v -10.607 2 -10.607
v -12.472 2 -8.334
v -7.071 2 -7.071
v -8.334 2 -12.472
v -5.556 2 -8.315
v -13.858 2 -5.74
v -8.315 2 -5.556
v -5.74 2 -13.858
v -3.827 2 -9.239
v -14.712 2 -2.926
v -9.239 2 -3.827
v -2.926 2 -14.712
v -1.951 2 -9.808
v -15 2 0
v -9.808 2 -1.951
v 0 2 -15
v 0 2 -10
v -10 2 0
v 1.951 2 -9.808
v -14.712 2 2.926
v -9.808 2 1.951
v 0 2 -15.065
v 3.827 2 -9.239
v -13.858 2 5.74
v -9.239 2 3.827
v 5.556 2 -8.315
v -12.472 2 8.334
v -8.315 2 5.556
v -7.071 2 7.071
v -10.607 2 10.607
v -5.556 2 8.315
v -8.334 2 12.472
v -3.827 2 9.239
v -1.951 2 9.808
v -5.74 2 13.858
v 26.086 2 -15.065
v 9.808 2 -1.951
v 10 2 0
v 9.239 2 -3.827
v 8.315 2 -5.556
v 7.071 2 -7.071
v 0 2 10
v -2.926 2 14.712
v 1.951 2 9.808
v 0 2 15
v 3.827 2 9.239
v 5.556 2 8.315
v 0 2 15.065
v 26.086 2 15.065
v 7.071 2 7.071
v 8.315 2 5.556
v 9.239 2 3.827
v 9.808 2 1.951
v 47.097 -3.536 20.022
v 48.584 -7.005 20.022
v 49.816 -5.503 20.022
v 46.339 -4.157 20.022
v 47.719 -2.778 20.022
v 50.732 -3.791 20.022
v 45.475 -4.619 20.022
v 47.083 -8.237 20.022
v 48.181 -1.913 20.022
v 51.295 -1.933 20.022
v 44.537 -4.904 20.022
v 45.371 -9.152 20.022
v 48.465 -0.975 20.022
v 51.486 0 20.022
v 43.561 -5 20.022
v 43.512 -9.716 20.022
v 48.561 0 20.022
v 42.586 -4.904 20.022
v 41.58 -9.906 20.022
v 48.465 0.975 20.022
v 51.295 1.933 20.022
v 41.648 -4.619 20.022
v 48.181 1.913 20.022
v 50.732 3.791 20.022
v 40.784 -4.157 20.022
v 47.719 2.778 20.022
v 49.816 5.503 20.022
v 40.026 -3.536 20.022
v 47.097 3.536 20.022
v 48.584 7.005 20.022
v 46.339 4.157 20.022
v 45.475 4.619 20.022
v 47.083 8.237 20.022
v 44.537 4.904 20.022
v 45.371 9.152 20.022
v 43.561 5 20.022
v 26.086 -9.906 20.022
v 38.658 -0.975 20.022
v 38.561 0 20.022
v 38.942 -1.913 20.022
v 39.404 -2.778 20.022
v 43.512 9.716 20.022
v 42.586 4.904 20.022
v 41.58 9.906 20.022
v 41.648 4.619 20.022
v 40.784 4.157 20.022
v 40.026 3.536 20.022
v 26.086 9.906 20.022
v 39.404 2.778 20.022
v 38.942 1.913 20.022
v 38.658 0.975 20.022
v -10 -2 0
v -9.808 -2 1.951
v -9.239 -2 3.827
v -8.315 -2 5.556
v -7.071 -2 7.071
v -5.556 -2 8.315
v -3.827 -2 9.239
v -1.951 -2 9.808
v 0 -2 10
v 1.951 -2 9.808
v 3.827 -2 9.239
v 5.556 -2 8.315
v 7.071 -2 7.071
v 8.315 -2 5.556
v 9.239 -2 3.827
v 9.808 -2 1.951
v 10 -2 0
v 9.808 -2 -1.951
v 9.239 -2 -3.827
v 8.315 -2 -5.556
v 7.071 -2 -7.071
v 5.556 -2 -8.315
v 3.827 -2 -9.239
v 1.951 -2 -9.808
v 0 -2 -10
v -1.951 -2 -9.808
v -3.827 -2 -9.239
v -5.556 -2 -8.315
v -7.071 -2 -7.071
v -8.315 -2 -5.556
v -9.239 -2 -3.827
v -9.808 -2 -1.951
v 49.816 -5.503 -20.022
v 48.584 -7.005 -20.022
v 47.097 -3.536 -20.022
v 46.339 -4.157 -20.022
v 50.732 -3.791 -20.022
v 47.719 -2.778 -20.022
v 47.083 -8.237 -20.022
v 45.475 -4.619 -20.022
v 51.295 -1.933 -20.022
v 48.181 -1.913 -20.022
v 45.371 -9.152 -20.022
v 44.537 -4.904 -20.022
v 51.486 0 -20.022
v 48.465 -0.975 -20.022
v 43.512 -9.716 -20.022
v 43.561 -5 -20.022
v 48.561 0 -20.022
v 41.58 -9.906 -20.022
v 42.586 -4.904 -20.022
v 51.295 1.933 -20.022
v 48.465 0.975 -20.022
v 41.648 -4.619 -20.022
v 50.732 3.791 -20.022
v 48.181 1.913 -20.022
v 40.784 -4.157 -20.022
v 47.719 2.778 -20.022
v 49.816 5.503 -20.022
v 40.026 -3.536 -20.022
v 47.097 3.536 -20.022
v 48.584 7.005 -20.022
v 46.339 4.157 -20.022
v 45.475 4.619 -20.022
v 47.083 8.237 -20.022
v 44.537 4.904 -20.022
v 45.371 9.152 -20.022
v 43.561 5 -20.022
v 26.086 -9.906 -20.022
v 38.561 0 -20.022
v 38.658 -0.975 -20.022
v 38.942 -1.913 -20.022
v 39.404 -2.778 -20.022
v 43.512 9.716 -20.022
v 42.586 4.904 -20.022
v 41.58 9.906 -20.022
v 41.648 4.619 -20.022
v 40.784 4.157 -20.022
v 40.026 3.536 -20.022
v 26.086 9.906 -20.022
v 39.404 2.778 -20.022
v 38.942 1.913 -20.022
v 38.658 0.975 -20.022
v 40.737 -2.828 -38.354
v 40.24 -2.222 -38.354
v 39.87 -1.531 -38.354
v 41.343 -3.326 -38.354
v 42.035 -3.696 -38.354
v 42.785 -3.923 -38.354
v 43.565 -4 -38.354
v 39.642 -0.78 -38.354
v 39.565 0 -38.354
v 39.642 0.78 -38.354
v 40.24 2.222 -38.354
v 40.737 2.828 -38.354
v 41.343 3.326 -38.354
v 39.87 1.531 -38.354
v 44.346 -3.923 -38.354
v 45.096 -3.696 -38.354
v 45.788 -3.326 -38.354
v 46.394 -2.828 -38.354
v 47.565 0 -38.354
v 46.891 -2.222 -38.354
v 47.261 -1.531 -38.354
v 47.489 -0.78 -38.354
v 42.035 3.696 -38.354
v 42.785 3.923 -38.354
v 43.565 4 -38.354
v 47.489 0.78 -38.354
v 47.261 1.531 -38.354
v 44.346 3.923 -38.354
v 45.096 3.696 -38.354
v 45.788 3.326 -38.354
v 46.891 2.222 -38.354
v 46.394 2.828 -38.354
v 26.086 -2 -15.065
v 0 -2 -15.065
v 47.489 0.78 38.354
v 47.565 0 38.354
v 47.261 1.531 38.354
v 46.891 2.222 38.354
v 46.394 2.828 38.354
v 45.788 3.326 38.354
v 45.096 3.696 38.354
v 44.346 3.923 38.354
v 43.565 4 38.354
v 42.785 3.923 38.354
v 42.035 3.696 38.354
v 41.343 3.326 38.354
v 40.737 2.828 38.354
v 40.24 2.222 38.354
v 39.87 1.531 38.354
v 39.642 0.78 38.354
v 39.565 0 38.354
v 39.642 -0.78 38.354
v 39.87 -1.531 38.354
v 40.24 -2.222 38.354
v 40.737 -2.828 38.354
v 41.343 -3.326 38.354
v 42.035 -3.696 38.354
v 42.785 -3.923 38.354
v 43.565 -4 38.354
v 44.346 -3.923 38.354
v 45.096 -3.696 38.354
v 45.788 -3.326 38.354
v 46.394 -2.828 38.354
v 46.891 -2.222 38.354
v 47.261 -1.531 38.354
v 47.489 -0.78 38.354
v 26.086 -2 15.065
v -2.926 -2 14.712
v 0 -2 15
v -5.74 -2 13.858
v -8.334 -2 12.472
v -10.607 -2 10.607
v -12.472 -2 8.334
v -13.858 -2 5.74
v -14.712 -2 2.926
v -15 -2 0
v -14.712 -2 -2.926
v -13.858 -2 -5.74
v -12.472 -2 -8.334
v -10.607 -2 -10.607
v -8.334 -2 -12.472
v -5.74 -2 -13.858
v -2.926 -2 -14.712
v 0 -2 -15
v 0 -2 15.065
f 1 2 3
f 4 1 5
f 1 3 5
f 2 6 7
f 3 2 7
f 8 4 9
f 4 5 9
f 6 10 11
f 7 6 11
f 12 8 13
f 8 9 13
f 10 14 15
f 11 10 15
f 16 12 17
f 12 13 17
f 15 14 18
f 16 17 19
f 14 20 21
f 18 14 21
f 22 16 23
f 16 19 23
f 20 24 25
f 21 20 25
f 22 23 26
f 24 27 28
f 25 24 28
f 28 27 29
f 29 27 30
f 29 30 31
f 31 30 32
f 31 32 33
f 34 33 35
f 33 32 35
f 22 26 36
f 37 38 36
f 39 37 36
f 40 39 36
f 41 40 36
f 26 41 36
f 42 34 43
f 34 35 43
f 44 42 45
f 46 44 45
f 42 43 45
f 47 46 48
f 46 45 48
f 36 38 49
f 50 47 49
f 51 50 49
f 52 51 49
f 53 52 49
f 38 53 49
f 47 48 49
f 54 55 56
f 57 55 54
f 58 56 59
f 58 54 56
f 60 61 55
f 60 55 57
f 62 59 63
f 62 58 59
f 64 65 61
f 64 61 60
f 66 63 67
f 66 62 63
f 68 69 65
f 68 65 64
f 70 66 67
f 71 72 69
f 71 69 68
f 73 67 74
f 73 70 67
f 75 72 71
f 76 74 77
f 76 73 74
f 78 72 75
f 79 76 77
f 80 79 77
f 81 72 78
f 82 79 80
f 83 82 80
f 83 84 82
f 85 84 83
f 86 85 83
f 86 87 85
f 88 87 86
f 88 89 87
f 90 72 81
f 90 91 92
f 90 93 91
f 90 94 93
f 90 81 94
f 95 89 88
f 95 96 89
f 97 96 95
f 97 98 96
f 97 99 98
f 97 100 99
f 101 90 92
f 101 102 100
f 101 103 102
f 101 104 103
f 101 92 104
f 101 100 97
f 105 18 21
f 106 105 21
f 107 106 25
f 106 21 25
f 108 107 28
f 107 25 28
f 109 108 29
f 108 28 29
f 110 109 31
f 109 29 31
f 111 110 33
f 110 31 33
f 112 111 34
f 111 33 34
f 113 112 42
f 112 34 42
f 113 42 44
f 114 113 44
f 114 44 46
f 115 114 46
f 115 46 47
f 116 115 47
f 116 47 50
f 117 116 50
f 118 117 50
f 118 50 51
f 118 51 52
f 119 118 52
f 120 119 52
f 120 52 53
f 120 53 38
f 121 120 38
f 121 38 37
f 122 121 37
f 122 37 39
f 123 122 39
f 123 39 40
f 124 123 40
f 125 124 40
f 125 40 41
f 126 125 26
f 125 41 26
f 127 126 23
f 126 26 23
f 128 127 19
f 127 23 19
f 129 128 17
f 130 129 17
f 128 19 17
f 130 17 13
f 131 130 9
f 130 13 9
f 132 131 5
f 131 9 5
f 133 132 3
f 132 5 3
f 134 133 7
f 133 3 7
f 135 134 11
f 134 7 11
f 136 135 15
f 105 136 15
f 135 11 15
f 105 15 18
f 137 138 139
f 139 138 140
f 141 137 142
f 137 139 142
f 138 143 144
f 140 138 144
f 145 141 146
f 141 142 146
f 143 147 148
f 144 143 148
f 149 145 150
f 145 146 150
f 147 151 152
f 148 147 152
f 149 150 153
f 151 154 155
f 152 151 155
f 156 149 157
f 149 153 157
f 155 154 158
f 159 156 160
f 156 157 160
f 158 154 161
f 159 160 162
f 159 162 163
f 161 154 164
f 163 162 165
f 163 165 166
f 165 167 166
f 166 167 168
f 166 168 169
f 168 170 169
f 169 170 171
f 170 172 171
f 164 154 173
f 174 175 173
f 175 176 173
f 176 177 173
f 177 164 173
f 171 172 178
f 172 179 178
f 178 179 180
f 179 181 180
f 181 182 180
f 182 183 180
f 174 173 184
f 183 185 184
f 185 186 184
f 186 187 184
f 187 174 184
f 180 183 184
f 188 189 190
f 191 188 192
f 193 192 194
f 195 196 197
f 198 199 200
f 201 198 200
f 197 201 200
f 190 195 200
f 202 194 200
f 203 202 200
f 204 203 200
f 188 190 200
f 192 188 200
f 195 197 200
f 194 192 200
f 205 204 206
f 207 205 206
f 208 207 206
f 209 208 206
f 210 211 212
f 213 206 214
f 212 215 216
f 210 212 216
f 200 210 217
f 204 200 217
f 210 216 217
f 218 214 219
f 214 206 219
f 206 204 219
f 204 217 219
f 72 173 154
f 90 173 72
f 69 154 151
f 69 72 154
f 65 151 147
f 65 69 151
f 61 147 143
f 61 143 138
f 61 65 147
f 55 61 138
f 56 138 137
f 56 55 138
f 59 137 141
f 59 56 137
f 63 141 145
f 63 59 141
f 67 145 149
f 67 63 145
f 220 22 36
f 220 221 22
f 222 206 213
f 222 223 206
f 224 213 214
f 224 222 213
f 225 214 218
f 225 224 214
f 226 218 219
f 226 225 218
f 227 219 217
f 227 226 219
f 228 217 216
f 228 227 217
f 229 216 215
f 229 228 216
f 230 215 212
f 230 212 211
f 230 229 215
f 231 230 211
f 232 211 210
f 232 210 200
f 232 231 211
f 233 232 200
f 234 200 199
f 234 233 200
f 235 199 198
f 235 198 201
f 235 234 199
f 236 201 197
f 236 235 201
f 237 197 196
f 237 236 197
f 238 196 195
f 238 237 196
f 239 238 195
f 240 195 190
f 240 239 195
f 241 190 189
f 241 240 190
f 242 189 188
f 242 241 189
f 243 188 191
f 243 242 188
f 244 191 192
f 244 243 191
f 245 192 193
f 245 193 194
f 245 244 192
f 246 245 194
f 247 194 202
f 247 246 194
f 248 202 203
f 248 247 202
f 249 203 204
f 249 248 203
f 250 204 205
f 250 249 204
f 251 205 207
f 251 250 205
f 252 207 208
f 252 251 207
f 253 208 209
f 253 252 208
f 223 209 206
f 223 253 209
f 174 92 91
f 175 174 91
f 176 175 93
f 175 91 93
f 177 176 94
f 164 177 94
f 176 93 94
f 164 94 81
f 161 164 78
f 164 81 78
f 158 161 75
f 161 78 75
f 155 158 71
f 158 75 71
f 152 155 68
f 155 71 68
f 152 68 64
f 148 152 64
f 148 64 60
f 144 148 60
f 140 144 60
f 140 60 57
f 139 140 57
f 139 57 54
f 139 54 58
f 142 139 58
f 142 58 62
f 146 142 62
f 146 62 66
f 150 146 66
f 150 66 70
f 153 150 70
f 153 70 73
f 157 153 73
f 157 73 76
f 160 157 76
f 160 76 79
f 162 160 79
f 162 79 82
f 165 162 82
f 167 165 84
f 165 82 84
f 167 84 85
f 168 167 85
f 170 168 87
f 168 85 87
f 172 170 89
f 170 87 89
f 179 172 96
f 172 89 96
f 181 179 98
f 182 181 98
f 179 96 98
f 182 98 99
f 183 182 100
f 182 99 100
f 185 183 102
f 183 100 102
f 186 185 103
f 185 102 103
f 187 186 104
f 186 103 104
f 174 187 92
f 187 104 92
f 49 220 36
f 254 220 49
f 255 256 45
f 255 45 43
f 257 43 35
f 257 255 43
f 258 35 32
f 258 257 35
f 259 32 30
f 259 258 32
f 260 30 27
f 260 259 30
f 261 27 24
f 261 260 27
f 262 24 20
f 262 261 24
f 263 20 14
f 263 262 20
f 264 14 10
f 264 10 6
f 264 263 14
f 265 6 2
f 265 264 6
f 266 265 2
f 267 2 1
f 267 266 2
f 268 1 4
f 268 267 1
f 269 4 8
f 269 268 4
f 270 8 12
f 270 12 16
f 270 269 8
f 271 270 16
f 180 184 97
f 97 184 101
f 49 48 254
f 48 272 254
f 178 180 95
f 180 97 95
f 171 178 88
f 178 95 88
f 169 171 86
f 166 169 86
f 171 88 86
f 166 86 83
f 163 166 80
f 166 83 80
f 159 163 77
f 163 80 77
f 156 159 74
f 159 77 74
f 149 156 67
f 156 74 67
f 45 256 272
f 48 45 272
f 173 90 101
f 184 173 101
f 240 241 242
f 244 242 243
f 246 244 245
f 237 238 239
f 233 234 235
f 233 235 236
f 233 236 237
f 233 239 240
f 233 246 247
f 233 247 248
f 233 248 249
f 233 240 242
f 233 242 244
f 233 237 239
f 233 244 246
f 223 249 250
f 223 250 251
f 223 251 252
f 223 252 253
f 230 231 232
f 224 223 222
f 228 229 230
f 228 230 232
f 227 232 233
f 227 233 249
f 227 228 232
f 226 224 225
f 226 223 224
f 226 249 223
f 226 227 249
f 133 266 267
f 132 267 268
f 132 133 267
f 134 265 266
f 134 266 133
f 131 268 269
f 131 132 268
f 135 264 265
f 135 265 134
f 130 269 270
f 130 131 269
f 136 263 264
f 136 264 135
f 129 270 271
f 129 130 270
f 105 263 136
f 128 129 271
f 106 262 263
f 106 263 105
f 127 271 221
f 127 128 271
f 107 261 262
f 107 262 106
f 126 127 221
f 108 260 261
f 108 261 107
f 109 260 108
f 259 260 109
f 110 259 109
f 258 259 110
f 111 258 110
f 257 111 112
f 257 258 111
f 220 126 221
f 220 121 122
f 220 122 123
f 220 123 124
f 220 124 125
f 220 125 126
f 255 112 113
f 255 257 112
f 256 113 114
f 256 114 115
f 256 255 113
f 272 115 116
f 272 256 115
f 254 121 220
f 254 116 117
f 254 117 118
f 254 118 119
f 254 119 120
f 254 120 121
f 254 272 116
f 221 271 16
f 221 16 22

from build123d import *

# Parameters (mm, degrees)
F0_R      = 15
F1_DEPTH  = 2
F3_W      = 26.0858
F3_H      = 15.0651354343
F4_DEPTH  = 2
F6_D      = 20
F7_W      = 19.812
F7_H      = 40.0436846481
F7_W_2    = 4
F7_H_2    = 30.1302708685
F8_DEPTH  = 25.4
F9_R      = 9.90599
F11_D     = 10
F12_R     = 4
F13_DEPTH = 38.354


# Not quite as in the source:
# - a fillet or chamfer is up to 0.001 mm smaller than in the source, because OpenCascade refuses the exact size


with BuildPart() as f1:
    # F0 (on Front) → F1 (new body, symmetric)
    with BuildSketch(Plane.XZ):
        Circle(F0_R)
    extrude(amount=F1_DEPTH, both=True)

    # F3 (on Front) → F4 (join, symmetric)
    with BuildSketch(Plane.XZ):
        with Locations((13.0429, 7.5325677171)):
            Rectangle(F3_W, F3_H)
    extrude(amount=F4_DEPTH, both=True)

    # F5: F1 across plane


with BuildPart() as f1_1:
    add(f1.part)
    add(f1.part.mirror(Plane.XY))

    # F6 (through all)
    with Locations(Plane.XZ.offset(2)):
        with Locations((0, 0)):
            Hole(F6_D / 2)


with BuildPart() as f8:
    # F7 (on face) → F8 (new body)
    with BuildSketch(Plane.YZ.offset(26.0858)):
        Rectangle(F7_W, F7_H)
        Rectangle(F7_W_2, F7_H_2, mode=Mode.SUBTRACT)
        Rectangle(F7_W_2, F7_H_2)
    extrude(amount=F8_DEPTH)

    # F9 (radius 9.906 in the source; OpenCascade refuses exactly that, so slightly less here)
    f9_edges = [f8.edges().sort_by_distance(p)[0] for p in [
        (51.4858, -9.906, 0),
        (51.4858, 9.906, 0),
    ]]
    fillet(f9_edges, radius=F9_R)

    # F11 (through all)
    with Locations(Plane(origin=(0, 0, -20.021842324), x_dir=(1, 0, 0), z_dir=(0, 0, -1))):
        with Locations((43.5614921153, 0)):
            Hole(F11_D / 2)


with BuildPart() as f13:
    # F12 (on Top) → F13 (new body, symmetric)
    with BuildSketch(Plane.XY):
        with Locations((43.5654483736, 0)):
            Circle(F12_R)
    extrude(amount=F13_DEPTH, both=True)


solid = Compound([f1_1.part, f8.part, f13.part])
